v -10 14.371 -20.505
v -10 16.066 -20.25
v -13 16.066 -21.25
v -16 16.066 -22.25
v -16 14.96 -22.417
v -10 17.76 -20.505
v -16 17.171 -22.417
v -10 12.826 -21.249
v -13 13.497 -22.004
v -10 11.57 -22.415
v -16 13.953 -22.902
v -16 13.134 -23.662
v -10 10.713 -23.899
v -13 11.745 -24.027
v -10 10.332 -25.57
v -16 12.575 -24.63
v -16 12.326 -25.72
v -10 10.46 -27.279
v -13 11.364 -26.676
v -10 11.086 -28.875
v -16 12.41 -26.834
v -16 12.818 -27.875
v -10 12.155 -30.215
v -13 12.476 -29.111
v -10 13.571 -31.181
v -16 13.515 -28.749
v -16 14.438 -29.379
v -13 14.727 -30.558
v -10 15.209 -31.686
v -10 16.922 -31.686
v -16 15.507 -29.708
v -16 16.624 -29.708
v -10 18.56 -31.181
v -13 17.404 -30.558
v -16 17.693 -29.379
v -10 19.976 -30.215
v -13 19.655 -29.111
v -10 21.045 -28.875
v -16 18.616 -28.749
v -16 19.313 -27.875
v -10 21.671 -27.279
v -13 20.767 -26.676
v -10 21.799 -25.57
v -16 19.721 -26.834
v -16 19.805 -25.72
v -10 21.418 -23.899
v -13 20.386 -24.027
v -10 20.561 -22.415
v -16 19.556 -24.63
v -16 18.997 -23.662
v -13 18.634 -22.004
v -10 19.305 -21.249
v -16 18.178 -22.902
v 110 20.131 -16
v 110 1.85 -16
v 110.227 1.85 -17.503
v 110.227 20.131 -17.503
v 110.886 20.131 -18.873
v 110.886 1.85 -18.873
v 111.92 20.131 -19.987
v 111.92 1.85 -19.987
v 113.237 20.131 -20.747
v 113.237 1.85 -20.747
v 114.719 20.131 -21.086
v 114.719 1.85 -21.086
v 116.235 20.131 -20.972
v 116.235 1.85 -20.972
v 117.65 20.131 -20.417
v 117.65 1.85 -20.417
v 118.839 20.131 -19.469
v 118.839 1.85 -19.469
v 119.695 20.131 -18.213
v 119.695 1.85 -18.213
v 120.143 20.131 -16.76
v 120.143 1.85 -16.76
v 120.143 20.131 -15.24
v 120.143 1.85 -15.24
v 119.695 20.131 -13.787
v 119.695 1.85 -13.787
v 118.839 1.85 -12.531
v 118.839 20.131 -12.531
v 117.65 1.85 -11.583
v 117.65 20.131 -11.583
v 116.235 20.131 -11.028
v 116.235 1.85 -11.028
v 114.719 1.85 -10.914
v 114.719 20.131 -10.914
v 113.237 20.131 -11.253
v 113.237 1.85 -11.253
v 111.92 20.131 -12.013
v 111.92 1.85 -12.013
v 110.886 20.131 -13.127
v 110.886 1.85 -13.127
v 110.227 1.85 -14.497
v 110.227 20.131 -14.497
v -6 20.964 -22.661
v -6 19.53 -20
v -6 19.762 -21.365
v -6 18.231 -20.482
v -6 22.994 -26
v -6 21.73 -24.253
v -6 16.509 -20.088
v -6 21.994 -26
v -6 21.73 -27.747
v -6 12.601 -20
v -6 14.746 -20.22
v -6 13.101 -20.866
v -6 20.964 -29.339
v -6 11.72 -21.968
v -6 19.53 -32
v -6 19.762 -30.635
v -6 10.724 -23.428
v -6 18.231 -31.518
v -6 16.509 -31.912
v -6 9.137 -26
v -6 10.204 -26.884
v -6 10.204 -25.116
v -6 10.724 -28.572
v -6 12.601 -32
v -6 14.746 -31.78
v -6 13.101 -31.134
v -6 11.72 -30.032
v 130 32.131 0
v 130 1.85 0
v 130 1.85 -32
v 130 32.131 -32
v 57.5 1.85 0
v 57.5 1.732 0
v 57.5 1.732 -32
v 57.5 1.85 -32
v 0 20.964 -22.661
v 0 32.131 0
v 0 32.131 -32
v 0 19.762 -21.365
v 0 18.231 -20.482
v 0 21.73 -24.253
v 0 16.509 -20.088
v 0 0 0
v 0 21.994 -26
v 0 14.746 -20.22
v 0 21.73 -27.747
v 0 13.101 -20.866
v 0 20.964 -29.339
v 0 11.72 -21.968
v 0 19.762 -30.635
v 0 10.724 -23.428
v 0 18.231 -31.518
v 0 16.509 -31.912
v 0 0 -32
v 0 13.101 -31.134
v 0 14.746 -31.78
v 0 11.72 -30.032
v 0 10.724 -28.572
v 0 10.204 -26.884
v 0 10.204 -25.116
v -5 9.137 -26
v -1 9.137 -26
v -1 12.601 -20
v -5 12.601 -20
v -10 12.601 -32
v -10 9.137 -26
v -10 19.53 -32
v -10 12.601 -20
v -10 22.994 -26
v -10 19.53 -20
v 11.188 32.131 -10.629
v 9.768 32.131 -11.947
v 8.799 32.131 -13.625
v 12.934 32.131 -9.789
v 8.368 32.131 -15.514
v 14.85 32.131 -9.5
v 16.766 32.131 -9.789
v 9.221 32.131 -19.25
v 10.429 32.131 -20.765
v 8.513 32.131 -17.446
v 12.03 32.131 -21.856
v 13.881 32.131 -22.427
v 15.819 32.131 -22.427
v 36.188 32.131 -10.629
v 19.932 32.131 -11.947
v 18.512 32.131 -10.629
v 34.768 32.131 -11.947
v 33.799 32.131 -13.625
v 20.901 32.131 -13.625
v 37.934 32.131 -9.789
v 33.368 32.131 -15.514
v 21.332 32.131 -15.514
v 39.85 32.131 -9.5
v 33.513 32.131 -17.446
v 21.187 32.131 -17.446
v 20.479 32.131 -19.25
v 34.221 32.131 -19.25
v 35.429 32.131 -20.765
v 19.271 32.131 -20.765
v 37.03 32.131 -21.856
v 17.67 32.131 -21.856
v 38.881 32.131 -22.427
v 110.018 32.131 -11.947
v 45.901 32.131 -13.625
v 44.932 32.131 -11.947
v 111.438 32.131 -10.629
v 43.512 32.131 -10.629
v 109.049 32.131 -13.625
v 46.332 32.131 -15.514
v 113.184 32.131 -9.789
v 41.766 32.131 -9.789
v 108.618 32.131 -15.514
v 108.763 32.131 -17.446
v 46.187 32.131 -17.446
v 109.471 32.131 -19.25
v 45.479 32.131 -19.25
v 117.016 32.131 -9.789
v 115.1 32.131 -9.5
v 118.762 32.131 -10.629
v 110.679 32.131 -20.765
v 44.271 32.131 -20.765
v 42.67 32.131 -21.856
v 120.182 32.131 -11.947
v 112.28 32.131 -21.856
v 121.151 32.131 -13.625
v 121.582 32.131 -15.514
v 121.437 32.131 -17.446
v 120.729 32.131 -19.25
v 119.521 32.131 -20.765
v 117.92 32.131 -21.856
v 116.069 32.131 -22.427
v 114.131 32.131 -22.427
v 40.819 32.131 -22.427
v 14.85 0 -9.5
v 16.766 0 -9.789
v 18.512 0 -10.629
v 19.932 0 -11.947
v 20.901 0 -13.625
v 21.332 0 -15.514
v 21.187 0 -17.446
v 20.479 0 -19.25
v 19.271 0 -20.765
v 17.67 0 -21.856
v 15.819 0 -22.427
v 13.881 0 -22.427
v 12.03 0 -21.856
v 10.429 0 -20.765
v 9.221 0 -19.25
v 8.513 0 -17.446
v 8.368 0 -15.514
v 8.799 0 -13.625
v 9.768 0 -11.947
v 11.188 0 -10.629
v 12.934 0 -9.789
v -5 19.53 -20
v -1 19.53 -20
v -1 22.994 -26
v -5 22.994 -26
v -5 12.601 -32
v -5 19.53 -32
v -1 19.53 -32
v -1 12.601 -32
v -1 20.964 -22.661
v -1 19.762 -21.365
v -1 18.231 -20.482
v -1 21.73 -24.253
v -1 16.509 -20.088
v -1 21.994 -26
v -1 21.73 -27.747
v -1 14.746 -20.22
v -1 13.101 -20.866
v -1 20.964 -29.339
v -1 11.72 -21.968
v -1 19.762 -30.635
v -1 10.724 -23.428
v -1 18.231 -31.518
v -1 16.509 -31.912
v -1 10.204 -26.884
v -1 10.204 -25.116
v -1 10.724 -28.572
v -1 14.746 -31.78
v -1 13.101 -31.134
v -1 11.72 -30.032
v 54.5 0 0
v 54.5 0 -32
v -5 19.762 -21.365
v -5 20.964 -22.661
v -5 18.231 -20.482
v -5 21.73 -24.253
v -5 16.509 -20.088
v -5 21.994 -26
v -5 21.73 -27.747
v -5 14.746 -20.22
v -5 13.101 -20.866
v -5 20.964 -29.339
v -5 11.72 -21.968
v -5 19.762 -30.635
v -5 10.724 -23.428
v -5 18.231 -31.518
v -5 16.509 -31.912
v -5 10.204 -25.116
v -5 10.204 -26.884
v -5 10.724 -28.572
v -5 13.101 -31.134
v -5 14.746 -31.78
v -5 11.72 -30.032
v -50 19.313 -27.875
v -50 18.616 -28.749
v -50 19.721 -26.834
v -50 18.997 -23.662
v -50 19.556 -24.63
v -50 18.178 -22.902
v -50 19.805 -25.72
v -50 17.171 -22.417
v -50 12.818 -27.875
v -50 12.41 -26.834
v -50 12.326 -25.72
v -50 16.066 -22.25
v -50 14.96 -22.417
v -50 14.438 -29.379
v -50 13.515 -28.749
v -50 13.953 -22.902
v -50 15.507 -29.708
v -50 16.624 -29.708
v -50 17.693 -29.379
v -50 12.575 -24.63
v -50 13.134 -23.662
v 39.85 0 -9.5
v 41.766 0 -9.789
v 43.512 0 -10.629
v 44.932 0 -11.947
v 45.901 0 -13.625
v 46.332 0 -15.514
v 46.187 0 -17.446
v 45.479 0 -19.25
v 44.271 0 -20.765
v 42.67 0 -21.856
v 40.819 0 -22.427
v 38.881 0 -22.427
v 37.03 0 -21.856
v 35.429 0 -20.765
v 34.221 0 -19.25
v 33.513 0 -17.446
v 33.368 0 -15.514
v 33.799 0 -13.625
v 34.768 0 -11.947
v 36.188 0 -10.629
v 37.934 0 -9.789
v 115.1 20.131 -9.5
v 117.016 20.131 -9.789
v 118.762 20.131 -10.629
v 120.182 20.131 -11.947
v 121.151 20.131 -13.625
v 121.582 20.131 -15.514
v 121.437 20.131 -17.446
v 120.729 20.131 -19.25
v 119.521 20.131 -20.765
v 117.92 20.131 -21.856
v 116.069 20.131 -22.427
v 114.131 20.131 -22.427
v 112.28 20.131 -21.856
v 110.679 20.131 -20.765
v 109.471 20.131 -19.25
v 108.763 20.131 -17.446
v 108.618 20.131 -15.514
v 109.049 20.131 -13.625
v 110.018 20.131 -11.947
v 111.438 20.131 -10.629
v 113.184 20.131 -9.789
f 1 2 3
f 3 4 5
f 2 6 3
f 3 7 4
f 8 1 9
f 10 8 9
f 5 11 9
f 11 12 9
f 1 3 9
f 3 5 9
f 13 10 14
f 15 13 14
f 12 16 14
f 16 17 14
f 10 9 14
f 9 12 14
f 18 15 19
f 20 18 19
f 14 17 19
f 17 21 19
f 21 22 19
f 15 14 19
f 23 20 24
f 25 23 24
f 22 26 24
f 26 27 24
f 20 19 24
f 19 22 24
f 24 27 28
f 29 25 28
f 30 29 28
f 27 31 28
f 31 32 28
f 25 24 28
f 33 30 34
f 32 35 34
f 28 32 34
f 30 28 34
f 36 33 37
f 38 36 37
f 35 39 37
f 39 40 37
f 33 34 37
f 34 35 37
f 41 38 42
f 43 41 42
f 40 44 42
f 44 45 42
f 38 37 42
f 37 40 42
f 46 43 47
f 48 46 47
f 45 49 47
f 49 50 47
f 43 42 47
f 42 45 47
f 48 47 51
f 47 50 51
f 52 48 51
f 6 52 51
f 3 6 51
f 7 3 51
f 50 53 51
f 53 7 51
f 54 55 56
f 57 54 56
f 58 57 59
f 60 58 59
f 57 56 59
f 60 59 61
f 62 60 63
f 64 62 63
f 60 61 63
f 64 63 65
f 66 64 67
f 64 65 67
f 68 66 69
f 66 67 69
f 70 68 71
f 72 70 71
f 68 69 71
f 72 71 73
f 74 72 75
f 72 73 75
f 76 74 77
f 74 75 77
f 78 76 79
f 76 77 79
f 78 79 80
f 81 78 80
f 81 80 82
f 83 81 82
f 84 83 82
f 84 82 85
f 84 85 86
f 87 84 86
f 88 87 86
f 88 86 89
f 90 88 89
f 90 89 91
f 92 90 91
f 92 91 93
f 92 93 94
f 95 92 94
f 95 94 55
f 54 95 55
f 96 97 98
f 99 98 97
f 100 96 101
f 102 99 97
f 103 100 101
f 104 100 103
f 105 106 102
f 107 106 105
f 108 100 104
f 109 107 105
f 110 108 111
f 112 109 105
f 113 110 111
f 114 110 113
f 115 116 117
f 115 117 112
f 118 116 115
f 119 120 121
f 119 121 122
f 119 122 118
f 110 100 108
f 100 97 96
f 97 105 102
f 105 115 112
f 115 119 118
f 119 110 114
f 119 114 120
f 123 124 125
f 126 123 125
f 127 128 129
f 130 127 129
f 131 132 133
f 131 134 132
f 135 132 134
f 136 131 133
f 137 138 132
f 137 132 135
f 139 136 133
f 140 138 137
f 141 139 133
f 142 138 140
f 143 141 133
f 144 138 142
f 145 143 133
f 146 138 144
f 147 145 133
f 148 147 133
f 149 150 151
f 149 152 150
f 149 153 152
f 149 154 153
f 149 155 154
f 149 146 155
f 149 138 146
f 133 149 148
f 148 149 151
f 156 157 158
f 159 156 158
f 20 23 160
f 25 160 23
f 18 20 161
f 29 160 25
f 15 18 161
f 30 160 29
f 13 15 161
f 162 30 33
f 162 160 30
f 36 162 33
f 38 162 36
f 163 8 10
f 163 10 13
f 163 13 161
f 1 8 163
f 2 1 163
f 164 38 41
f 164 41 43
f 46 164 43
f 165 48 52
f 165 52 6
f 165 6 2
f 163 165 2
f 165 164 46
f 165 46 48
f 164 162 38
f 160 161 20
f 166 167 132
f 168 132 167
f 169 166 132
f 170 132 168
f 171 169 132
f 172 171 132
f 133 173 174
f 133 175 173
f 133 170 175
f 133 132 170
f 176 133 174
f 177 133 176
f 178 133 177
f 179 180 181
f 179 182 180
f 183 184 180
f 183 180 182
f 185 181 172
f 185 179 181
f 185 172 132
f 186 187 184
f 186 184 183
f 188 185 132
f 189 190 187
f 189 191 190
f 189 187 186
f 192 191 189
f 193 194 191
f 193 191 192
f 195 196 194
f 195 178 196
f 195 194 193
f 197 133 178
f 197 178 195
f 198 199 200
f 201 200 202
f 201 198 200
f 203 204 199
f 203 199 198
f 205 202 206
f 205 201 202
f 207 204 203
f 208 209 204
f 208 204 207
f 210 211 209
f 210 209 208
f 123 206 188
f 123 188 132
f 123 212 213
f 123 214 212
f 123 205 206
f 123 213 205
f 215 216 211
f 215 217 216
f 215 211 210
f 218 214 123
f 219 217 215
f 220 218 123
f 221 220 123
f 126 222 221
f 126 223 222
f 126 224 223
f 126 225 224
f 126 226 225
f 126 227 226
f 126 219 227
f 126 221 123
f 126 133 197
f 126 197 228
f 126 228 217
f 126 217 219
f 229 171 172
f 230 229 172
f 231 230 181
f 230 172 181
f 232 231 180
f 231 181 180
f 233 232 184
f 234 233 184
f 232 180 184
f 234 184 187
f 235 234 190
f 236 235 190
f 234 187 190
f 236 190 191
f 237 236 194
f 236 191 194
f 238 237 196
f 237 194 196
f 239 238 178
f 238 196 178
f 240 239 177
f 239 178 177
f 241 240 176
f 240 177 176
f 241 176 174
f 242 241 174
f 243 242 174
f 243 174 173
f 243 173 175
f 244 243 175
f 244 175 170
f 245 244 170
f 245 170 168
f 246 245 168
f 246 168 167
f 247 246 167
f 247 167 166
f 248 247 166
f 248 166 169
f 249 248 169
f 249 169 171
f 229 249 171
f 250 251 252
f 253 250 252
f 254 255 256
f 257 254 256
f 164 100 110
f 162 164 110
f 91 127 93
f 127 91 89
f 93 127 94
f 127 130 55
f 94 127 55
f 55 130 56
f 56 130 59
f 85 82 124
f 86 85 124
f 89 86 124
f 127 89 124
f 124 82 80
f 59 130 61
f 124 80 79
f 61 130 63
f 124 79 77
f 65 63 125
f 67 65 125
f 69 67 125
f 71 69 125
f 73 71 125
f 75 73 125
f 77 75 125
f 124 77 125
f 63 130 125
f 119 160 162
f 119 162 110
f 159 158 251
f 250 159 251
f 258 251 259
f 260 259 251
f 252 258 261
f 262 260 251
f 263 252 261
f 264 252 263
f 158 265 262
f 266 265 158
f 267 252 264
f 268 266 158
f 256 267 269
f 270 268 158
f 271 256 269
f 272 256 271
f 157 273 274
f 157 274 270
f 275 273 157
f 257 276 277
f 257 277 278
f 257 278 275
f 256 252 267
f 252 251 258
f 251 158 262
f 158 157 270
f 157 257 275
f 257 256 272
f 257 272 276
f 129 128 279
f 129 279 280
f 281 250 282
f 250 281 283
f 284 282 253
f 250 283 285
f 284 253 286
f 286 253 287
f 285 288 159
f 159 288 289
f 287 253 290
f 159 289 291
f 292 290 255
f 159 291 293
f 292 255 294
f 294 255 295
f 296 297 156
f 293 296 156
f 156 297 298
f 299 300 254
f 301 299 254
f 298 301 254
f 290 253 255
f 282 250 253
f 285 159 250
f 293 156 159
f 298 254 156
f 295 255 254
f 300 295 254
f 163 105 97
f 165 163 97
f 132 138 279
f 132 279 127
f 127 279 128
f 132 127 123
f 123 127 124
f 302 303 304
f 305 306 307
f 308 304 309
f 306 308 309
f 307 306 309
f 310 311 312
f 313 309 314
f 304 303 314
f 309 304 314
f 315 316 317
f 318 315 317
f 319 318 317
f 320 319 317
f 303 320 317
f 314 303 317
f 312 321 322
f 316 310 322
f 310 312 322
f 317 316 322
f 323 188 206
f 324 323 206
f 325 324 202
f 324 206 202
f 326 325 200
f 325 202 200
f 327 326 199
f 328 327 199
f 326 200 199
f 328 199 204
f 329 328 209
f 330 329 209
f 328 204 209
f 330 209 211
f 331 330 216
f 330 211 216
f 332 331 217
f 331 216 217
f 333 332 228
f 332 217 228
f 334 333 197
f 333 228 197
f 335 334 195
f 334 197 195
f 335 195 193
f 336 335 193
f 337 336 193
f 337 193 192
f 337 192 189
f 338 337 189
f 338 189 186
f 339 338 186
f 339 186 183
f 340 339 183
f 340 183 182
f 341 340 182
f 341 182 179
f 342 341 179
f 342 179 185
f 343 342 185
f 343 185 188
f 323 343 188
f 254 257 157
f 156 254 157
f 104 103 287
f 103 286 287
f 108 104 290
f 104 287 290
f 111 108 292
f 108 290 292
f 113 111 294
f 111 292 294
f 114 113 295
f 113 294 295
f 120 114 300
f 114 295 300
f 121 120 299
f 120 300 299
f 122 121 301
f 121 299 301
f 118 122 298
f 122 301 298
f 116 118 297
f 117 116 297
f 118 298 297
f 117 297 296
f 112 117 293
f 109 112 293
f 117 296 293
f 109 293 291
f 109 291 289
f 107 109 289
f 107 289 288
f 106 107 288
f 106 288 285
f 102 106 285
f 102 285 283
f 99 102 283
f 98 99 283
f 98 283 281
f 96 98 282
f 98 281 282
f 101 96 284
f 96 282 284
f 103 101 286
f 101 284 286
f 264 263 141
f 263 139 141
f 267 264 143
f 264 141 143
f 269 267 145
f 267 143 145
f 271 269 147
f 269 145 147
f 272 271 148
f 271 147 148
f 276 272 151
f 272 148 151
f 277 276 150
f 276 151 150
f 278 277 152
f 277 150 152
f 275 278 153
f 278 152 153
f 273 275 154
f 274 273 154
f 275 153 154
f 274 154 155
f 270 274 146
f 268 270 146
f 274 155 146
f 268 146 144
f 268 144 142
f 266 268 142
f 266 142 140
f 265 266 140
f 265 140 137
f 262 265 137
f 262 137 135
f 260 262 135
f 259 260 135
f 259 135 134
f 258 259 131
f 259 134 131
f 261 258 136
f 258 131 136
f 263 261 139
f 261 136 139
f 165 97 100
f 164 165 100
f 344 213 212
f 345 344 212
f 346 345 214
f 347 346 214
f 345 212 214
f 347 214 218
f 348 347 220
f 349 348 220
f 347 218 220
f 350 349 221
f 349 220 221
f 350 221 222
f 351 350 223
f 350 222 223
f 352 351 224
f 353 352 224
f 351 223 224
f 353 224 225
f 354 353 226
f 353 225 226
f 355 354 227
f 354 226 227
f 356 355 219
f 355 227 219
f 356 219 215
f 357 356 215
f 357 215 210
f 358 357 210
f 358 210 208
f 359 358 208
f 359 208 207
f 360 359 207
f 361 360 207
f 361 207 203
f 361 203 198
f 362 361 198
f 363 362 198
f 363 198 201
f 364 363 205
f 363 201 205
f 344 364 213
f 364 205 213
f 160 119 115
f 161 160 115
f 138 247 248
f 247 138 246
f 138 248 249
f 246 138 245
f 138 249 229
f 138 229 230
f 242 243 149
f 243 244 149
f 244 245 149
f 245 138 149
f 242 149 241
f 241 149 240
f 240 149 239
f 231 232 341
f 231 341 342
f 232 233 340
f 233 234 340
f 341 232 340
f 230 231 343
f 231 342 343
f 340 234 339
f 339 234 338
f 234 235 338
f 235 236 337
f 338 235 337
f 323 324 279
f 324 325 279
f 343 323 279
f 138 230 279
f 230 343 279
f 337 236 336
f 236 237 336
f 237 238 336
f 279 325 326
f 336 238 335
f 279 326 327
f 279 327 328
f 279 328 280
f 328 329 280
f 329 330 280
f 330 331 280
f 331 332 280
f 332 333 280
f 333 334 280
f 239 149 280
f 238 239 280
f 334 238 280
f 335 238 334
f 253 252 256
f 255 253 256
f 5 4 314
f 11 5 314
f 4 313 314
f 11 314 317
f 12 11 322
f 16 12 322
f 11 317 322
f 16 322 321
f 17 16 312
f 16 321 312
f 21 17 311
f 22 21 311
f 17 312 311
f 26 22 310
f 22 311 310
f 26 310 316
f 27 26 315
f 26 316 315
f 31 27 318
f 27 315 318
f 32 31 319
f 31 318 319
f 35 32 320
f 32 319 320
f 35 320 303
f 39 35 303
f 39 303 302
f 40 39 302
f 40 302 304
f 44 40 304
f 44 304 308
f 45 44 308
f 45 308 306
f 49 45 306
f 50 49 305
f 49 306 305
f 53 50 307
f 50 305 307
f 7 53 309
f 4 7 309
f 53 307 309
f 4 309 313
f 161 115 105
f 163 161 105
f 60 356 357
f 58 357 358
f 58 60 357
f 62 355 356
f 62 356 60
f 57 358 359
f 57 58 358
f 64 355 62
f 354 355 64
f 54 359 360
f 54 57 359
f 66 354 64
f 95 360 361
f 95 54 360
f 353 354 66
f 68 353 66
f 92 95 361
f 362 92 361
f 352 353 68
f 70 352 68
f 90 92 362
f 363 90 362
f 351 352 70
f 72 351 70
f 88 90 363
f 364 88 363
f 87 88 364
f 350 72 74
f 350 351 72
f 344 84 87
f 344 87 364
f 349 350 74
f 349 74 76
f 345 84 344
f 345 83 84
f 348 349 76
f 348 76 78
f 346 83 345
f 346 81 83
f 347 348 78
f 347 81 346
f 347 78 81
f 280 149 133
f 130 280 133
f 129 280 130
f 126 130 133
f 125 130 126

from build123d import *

# Parameters (mm, degrees)
SKETCH1_W                     = 130
SKETCH1_H                     = 32
BOSS_EXTRUDE1_DEPTH           = 32.131
SKETCH2_R                     = 6.5
CUT_EXTRUDE1_DEPTH            = 138.68224708
SKETCH3_R                     = 6.5
CUT_EXTRUDE2_DEPTH            = 12
TAP_DRILL_FOR_M12X1_75_TAP1_D = 10.2
CUT_EXTRUDE3_START            = -32.131
SKETCH10_W                    = 72.5
SKETCH10_H                    = 32
CUT_EXTRUDE3_DEPTH            = 1.85
CHAMFER1_SIZE                 = 3
CHAMFER1_SIZE2                = 1.732050808
BOSS_EXTRUDE2_DEPTH           = 10
SKETCH13_W                    = 1
SKETCH13_H                    = 1


with BuildPart() as part:
    # Sketch1 → Boss-Extrude1 (new body)
    with BuildSketch(Plane(origin=(0, 0, 0), x_dir=(1, 0, 0), z_dir=(0, 1, 0))):
        with Locations((65, 16)):
            Rectangle(SKETCH1_W, SKETCH1_H)
    extrude(amount=BOSS_EXTRUDE1_DEPTH)

    # Sketch2 → Cut-Extrude1 (cut, through all)
    with BuildSketch(Plane(origin=(0, 32.131, 0), x_dir=(1, 0, 0), z_dir=(0, 1, 0))):
        with Locations(Location((14.85, 16, 0), (0, 0, 270))):
            Circle(SKETCH2_R)
        with Locations(Location((39.85, 16, 0), (0, 0, 270))):
            Circle(SKETCH2_R)
    extrude(amount=-CUT_EXTRUDE1_DEPTH, mode=Mode.SUBTRACT)

    # Sketch3 → Cut-Extrude2 (cut)
    with BuildSketch(Plane(origin=(0, 32.131, 0), x_dir=(1, 0, 0), z_dir=(0, 1, 0))):
        with Locations(Location((115.1, 16, 0), (0, 0, 270))):
            Circle(SKETCH3_R)
    extrude(amount=-CUT_EXTRUDE2_DEPTH, mode=Mode.SUBTRACT)

    # Tap Drill for M12x1.75 Tap1 (through all)
    with Locations(Plane(origin=(0, 20.131, 0), x_dir=(1, 0, 0), z_dir=(0, 1, 0))):
        with Locations((115.1, 16)):
            Hole(TAP_DRILL_FOR_M12X1_75_TAP1_D / 2)

    # Sketch10 → Cut-Extrude3 (cut)
    with BuildSketch(Plane(origin=(0, 32.131, 0), x_dir=(1, 0, 0), z_dir=(0, 1, 0)).offset(CUT_EXTRUDE3_START)):
        with Locations((93.75, 16)):
            Rectangle(SKETCH10_W, SKETCH10_H)
    extrude(amount=CUT_EXTRUDE3_DEPTH, mode=Mode.SUBTRACT)

    # Chamfer1
    chamfer1_edges = [part.edges().sort_by_distance(p)[0] for p in [
        (57.5, 0, -16),
    ]]
    chamfer1_side = [part.faces().sort_by_distance(p)[0] for p in [
        (28.986038139, 0, -16),
    ]]
    chamfer(chamfer1_edges, length=CHAMFER1_SIZE, length2=CHAMFER1_SIZE2, reference=chamfer1_side[0])

    # Sketch12 → Boss-Extrude2 (add)
    with BuildSketch(Plane.ZY):
        Polygon((-20, 12.601398385), (-20, 19.529601615), (-26, 22.99370323), (-32, 19.529601615), (-32, 12.601398385), (-26, 9.13729677), align=None)
    extrude(amount=BOSS_EXTRUDE2_DEPTH)

    # Sketch13 → Cut-Revolve1 (revolve, cut)
    with BuildSketch(Plane.XY.offset(-26)):
        with Locations((-0.5, 22.49370323)):
            Rectangle(SKETCH13_W, SKETCH13_H)
        with Locations((-5.5, 22.49370323)):
            Rectangle(SKETCH13_W, SKETCH13_H)
    revolve(axis=Axis((0, 16.0655, -26), (-1, 0, 0)), mode=Mode.SUBTRACT)

    # Sketch14 → Revolve2 (revolve)
    with BuildSketch(Plane.XY.offset(-26), mode=Mode.PRIVATE) as revolve2_sk:
        Polygon((-10, 21.8155), (-16, 19.8155), (-50, 19.8155), (-50, 16.0655), (-10, 16.0655), align=None)
    revolve(revolve2_sk.sketch.rotate(Axis((-50, 16.0655, -26), (1, 0, 0)), 90), axis=Axis((-50, 16.0655, -26), (1, 0, 0)))


solid = part.part
